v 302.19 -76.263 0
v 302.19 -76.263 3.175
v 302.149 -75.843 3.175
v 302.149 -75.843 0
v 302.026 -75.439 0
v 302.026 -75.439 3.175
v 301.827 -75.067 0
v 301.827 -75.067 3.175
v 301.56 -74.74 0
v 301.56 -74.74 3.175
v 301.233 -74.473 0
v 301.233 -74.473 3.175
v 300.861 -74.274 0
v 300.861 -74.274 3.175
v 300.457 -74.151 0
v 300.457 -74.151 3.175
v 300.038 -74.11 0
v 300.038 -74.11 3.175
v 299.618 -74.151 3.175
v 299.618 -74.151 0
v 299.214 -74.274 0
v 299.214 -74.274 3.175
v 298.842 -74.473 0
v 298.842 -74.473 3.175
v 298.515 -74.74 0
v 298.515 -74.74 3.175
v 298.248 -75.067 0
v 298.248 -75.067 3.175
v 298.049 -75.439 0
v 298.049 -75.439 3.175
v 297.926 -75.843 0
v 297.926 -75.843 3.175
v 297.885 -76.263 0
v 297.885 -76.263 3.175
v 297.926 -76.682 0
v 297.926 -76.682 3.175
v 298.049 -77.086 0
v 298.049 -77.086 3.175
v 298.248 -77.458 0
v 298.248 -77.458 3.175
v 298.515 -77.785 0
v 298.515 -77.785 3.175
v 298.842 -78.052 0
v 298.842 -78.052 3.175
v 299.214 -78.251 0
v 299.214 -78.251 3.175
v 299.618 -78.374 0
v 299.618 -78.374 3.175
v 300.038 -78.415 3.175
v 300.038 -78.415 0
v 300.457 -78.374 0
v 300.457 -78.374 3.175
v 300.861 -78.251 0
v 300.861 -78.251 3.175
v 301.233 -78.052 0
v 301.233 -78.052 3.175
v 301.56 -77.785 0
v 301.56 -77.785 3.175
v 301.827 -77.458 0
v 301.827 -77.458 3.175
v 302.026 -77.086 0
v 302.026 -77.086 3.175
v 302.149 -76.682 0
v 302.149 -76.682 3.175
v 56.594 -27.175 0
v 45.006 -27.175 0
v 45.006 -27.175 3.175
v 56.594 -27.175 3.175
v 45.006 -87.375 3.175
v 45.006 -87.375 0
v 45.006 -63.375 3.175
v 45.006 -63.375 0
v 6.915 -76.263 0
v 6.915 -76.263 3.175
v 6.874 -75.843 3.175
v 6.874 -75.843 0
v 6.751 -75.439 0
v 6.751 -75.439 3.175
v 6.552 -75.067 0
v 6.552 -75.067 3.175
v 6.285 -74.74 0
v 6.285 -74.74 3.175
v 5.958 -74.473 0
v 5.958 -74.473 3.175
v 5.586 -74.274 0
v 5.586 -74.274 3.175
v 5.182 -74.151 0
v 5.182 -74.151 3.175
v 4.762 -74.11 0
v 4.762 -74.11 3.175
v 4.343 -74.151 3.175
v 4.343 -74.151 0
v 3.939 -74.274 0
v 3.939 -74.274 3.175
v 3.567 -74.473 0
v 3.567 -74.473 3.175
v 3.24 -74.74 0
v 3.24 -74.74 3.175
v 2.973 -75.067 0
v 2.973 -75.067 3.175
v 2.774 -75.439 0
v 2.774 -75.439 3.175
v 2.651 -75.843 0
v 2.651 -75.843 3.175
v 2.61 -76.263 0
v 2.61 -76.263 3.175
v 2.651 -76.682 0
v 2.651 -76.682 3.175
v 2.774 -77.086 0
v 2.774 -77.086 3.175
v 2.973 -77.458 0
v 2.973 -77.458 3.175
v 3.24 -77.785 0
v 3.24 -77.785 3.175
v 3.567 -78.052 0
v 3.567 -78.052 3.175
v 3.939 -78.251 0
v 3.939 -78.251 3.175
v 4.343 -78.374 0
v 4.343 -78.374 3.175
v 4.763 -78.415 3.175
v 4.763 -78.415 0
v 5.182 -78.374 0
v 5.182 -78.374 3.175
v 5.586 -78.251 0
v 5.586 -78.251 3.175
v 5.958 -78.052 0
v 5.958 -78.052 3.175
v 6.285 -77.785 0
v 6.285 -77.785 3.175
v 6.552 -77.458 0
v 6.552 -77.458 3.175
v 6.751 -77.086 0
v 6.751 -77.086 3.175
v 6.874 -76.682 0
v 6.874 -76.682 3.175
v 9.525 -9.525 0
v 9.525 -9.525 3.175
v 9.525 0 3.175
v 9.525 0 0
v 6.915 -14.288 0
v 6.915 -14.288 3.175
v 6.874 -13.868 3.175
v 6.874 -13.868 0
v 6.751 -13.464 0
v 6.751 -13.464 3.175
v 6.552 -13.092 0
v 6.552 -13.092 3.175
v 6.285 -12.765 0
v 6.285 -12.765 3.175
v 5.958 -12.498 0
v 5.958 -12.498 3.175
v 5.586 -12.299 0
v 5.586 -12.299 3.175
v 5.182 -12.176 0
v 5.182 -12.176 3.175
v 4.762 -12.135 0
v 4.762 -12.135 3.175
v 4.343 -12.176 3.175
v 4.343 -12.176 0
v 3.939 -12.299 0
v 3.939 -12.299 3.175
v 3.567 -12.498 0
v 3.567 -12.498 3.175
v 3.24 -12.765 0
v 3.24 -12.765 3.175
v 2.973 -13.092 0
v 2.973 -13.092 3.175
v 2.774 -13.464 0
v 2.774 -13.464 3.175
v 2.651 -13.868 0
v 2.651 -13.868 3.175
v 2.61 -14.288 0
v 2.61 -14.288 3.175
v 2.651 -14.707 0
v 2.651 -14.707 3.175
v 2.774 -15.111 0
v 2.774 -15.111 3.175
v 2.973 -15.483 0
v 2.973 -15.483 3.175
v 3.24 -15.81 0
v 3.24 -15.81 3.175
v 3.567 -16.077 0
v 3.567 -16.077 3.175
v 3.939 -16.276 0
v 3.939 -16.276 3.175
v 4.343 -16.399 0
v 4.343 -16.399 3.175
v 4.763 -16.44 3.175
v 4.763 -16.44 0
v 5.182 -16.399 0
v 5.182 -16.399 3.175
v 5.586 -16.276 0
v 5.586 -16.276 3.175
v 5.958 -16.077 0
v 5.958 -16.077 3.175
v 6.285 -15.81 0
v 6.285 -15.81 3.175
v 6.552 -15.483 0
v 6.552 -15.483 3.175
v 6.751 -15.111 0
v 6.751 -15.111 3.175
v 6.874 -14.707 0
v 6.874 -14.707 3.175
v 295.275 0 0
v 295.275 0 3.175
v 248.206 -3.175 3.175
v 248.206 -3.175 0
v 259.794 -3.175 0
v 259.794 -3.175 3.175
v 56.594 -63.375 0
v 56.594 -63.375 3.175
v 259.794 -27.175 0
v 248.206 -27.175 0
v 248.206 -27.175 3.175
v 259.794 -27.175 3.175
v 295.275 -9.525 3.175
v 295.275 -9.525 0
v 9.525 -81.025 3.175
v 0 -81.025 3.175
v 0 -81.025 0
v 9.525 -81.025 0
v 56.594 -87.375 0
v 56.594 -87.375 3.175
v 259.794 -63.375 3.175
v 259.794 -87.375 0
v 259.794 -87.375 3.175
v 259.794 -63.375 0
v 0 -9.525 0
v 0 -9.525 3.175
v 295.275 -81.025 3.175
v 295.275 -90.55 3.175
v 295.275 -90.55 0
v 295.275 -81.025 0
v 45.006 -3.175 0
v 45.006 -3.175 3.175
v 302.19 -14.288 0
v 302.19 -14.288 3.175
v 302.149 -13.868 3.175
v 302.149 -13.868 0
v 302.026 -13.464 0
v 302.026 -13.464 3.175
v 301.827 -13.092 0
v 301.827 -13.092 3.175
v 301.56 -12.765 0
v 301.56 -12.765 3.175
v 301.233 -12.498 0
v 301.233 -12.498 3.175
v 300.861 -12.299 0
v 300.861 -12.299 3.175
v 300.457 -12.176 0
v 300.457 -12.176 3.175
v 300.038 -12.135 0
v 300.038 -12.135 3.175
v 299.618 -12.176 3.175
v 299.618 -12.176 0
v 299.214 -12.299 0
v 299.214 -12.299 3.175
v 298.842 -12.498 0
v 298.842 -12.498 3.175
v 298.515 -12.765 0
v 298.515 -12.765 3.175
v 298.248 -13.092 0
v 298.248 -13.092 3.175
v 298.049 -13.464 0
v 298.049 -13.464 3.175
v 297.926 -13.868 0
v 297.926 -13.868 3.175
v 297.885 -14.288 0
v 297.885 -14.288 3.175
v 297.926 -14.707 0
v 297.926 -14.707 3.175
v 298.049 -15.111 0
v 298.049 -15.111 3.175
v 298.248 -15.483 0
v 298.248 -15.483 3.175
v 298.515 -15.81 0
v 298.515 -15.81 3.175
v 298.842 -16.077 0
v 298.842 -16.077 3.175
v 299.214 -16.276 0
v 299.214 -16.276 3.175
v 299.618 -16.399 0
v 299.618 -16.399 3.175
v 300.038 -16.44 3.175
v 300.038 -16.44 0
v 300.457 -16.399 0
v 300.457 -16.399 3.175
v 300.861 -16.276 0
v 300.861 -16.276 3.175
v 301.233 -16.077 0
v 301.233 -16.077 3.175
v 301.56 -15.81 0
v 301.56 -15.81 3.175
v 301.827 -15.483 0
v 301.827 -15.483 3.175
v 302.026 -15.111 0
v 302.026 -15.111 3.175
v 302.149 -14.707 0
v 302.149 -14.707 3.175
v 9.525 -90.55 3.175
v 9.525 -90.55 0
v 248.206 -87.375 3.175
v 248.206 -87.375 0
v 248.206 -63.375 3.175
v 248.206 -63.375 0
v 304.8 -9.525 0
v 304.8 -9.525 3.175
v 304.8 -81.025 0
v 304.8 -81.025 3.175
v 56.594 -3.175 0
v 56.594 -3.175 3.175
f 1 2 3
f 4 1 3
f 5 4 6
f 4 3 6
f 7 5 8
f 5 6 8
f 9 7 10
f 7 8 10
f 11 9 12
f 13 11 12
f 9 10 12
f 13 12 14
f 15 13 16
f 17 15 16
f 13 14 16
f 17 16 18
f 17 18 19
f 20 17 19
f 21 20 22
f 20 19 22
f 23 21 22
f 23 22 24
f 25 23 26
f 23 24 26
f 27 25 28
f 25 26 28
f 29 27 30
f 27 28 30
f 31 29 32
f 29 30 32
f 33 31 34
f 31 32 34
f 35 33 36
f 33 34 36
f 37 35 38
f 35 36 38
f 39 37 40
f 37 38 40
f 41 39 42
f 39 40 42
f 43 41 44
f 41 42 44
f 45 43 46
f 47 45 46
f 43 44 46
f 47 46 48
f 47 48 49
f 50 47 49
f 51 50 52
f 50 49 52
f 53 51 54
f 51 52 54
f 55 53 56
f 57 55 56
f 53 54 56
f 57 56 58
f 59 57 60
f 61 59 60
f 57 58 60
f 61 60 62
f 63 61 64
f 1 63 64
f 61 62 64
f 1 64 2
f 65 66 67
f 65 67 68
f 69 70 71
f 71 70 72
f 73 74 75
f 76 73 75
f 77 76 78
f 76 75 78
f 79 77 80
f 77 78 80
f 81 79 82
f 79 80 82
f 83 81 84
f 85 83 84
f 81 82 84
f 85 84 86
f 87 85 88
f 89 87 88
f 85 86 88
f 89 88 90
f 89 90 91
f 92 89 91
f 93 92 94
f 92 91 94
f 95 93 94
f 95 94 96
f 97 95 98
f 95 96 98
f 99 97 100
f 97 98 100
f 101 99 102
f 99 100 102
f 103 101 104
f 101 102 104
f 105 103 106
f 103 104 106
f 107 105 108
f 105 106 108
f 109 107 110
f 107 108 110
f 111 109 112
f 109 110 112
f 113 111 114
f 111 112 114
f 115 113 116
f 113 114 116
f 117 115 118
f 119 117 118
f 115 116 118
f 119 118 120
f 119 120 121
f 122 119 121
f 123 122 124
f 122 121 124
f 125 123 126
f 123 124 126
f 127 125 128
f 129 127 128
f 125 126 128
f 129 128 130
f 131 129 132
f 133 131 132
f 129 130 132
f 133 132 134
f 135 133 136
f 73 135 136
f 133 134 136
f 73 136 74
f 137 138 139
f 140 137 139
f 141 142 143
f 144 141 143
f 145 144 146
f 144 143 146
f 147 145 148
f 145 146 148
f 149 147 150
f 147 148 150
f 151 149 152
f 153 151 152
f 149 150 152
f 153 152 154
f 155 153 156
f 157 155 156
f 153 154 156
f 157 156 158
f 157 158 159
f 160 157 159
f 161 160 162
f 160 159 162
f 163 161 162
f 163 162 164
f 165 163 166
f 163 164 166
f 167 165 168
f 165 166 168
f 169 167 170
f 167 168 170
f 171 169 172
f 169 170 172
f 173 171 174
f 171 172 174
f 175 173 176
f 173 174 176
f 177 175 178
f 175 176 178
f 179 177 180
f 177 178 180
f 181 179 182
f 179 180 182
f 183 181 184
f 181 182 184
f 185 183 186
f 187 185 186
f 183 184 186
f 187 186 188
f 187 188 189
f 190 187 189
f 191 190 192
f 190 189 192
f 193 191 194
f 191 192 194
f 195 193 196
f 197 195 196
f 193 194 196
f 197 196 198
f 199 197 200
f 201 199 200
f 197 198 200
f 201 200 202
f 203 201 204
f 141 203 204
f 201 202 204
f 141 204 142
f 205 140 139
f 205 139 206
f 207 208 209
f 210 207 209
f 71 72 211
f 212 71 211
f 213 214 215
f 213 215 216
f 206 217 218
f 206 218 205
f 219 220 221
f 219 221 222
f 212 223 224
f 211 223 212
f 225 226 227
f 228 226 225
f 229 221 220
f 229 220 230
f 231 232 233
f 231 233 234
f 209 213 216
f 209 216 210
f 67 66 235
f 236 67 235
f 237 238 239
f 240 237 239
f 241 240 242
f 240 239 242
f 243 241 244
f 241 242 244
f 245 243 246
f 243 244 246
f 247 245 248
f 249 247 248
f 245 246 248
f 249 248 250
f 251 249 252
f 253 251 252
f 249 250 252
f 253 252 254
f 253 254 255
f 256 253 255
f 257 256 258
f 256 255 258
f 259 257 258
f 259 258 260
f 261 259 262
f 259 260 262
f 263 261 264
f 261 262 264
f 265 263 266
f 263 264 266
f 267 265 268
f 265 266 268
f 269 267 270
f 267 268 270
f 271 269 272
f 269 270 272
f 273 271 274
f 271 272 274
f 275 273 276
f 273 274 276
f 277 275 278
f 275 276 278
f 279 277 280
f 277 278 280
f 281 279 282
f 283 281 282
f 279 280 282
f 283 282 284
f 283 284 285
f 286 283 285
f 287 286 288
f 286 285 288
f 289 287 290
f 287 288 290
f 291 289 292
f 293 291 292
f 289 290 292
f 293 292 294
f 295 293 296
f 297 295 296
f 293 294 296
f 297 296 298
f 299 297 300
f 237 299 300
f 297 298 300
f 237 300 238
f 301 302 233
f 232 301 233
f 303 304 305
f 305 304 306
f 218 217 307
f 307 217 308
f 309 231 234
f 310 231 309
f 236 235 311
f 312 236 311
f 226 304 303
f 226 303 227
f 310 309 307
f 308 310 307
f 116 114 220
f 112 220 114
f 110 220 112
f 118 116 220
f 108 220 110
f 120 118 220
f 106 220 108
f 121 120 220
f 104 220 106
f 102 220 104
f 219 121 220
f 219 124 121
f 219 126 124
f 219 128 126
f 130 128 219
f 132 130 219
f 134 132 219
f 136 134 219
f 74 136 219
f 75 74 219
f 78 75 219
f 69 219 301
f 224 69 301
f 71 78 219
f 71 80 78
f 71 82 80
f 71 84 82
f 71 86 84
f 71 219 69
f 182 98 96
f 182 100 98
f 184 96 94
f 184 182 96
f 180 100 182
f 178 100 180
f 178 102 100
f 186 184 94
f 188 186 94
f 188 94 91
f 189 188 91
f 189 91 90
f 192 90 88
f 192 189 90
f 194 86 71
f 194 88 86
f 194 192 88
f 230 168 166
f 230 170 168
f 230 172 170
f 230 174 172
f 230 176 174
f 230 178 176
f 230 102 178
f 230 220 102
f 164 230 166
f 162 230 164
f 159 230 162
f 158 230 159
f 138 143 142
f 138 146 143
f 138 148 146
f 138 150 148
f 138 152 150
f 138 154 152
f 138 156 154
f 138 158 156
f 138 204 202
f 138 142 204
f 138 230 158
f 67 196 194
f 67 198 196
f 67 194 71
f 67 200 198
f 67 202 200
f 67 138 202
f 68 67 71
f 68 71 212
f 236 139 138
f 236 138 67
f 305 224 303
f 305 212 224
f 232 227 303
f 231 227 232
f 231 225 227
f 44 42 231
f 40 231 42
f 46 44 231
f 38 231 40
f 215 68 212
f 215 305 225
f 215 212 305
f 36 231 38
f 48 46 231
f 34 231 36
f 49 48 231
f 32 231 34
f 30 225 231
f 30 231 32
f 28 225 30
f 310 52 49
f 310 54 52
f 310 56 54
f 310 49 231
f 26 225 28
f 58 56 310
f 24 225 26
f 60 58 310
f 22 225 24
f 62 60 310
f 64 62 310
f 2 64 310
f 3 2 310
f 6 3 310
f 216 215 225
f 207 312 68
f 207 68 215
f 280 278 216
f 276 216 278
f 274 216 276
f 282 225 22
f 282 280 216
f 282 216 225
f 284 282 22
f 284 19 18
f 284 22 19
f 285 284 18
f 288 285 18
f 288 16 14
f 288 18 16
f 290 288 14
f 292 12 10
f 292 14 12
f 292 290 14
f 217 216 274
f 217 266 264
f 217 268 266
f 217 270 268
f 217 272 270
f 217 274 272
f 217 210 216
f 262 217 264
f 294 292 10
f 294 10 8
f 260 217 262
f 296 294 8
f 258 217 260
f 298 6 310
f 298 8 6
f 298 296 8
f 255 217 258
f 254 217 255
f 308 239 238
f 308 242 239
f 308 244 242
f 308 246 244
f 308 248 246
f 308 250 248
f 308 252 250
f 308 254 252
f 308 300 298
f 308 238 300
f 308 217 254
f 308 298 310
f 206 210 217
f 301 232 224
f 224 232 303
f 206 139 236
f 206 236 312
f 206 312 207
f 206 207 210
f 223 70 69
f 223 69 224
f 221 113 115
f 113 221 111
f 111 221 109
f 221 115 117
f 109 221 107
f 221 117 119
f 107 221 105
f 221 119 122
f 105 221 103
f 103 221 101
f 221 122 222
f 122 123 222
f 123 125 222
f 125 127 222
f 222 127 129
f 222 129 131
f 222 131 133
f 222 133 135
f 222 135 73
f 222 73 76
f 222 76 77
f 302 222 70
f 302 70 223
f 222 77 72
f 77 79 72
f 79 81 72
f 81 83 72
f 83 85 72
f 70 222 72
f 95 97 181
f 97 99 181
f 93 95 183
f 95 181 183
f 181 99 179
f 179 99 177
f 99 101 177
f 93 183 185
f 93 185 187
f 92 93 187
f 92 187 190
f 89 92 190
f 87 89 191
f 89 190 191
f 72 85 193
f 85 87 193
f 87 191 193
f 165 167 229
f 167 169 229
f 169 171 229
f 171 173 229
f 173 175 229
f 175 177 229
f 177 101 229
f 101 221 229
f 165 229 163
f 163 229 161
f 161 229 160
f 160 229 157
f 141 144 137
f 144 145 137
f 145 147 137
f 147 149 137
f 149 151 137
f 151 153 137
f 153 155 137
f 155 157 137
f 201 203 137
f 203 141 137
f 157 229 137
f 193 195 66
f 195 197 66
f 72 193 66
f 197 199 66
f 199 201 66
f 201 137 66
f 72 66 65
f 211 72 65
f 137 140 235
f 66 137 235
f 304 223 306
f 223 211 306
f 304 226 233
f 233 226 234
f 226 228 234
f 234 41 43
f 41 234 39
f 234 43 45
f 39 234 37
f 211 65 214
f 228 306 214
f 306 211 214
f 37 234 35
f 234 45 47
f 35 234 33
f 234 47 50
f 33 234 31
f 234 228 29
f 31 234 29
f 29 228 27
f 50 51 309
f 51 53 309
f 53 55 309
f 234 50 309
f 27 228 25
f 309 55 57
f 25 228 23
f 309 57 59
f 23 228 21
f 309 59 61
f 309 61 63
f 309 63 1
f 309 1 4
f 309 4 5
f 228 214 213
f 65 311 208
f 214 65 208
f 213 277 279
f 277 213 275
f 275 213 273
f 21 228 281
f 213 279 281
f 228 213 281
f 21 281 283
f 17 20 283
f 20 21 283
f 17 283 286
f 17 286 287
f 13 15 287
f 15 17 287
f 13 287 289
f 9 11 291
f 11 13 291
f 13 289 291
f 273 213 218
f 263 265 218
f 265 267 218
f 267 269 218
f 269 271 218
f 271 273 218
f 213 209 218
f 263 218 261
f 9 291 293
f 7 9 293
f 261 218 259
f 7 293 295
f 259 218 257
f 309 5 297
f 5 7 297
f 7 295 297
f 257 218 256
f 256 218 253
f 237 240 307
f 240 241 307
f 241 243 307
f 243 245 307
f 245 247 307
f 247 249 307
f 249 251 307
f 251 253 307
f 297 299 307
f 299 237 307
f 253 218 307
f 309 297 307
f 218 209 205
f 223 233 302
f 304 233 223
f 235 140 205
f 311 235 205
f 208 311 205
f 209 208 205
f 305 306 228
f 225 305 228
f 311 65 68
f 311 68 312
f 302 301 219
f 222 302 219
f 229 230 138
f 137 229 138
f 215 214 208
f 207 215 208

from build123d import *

# Parameters (mm, degrees)
F0_W     = 304.8
F0_H     = 90.5500094
F0_W_2   = 11.5876832
F0_H_2   = 24
F1_DEPTH = 3.175
F2_R     = 2.15265
F3_DEPTH = 3.175
F4_W     = 9.525
F4_H     = 9.525
F5_DEPTH = 3.175


with BuildPart() as f1:
    # F0 (on Top) → F1 (new body)
    with BuildSketch(Plane.XY):
        with Locations((152.4, -45.2750047)):
            Rectangle(F0_W, F0_H)
        with Locations((50.8, -75.3750094)):
            Rectangle(F0_W_2, F0_H_2, mode=Mode.SUBTRACT)
        with Locations((254, -75.3750094)):
            Rectangle(F0_W_2, F0_H_2, mode=Mode.SUBTRACT)
        with Locations((50.8, -15.175)):
            Rectangle(F0_W_2, F0_H_2, mode=Mode.SUBTRACT)
        with Locations((254, -15.175)):
            Rectangle(F0_W_2, F0_H_2, mode=Mode.SUBTRACT)
    extrude(amount=F1_DEPTH)

    # F2 (on face) → F3 (cut, through all)
    with BuildSketch(Plane.XY.offset(3.175)):
        with Locations((4.7625, -14.2875)):
            Circle(F2_R)
        with Locations((4.7625, -76.2625094)):
            Circle(F2_R)
        with Locations((300.0375, -76.2625094)):
            Circle(F2_R)
        with Locations((300.0375, -14.2875)):
            Circle(F2_R)
    extrude(amount=-F3_DEPTH, mode=Mode.SUBTRACT)

    # F4 (on face) → F5 (cut, through all)
    with BuildSketch(Plane.XY.offset(3.175)):
        with Locations((300.0375, -4.7625)):
            Rectangle(F4_W, F4_H)
        with Locations((300.0375, -85.7875094)):
            Rectangle(F4_W, F4_H)
        with Locations((4.7625, -85.7875094)):
            Rectangle(F4_W, F4_H)
        with Locations((4.7625, -4.7625)):
            Rectangle(F4_W, F4_H)
    extrude(amount=-F5_DEPTH, mode=Mode.SUBTRACT)


solid = f1.part
